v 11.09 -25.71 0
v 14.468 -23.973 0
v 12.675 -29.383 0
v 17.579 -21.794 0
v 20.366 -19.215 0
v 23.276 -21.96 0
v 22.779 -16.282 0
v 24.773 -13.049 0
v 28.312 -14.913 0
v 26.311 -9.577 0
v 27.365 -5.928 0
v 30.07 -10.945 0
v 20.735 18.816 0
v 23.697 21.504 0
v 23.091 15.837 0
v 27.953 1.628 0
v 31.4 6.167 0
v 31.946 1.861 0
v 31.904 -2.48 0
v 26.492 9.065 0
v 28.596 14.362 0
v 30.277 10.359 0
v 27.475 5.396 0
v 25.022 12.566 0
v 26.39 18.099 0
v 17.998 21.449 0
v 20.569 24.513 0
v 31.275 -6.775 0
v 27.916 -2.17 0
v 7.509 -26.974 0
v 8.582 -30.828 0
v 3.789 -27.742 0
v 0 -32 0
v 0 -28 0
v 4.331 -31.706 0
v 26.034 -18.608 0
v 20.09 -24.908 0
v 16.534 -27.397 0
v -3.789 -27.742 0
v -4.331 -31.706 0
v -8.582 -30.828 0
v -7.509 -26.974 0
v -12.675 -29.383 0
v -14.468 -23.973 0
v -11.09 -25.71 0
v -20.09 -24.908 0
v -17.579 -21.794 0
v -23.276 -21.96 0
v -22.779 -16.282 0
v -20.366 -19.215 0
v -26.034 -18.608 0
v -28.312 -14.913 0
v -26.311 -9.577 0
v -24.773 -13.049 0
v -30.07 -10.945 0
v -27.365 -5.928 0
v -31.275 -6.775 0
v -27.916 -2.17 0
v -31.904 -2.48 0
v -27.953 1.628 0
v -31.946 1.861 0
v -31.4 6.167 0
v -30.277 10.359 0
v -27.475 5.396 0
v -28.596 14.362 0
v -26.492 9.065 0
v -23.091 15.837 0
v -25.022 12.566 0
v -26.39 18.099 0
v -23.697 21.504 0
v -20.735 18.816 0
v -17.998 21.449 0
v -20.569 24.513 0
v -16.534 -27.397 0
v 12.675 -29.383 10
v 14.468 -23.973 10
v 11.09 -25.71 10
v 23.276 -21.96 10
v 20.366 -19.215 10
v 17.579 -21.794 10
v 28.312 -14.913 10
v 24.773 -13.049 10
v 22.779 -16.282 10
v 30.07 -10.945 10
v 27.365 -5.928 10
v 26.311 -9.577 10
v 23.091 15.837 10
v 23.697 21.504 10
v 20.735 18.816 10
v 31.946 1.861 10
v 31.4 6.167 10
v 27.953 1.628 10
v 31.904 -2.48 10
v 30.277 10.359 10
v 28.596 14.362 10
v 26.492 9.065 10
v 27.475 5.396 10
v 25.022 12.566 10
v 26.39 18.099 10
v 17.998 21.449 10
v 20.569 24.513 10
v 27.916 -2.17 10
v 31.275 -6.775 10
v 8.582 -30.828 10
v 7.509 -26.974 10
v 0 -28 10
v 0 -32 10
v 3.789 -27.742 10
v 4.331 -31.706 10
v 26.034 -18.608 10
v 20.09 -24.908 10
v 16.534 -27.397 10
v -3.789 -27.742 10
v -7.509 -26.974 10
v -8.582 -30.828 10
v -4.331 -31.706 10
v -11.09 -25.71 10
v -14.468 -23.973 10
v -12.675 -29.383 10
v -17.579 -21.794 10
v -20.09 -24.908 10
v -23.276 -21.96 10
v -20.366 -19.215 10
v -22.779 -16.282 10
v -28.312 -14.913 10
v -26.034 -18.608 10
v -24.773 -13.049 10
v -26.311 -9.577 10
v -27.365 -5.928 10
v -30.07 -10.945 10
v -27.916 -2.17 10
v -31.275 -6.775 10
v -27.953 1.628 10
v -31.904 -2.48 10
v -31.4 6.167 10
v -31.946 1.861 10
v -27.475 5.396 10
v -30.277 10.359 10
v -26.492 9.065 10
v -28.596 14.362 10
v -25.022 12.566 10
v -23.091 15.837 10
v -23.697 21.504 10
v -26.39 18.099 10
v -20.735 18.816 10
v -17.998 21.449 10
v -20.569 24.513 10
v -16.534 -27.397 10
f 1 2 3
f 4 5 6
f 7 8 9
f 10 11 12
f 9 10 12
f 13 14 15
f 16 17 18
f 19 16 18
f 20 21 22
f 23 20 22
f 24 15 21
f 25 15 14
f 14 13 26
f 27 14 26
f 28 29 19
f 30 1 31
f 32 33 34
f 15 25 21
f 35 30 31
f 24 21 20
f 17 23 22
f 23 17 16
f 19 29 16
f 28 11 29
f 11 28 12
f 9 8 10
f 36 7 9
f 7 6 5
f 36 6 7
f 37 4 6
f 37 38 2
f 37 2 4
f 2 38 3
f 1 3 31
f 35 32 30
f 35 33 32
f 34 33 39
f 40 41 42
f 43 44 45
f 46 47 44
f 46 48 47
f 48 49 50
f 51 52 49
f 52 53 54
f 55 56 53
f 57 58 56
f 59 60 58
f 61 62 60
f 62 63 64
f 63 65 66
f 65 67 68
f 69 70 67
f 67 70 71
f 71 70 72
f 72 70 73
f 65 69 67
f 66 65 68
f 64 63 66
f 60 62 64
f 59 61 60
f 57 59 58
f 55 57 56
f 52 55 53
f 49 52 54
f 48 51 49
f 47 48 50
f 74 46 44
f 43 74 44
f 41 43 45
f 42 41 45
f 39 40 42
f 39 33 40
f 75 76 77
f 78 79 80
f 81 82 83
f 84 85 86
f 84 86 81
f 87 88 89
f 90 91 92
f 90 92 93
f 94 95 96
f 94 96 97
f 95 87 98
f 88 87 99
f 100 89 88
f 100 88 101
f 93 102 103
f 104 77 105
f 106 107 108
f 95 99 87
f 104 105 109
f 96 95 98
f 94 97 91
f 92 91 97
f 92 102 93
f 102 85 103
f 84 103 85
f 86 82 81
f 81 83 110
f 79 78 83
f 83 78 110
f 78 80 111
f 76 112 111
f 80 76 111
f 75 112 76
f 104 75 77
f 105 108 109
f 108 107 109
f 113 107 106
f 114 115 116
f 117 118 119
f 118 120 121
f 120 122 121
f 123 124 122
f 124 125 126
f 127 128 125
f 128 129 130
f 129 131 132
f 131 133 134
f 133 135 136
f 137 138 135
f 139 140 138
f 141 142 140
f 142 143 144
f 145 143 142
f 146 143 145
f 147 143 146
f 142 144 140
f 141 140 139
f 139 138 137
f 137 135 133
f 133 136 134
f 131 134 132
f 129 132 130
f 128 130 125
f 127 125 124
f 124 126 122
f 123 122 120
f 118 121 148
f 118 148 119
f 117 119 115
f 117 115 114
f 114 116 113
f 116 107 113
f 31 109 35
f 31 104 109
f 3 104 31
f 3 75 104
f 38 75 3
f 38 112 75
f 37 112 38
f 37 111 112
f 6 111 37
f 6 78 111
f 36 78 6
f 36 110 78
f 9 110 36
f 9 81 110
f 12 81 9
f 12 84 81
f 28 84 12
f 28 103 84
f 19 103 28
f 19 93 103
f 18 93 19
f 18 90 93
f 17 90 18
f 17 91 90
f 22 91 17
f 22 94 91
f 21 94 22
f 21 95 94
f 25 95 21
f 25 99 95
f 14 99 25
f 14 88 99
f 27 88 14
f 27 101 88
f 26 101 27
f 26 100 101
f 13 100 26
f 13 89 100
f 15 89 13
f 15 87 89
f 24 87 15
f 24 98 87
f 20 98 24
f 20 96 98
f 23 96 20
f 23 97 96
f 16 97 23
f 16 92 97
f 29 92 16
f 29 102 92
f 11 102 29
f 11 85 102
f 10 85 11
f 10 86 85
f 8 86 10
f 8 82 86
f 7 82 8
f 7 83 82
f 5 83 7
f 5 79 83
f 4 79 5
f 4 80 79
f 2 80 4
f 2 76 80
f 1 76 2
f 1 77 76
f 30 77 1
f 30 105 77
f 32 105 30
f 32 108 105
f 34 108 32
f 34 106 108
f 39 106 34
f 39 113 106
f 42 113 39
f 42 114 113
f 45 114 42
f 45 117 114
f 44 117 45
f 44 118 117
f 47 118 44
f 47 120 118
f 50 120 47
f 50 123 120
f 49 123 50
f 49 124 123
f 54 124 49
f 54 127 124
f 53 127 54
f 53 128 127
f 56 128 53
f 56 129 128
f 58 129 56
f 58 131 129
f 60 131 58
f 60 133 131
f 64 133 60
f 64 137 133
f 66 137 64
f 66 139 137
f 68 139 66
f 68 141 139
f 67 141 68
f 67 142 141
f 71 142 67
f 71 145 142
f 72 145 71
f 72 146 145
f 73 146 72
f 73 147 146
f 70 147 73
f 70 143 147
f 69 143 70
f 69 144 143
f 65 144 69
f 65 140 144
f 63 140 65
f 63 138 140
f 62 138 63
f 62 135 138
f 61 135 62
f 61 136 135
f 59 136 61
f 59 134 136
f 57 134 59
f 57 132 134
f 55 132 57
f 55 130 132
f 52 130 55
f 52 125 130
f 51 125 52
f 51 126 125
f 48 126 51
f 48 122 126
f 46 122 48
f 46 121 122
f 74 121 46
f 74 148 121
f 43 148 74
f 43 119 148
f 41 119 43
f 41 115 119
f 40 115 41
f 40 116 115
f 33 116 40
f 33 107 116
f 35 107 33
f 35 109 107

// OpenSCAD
$fn = 32;

// ----------------------------------------------------------------------
// Spring clip: 64 mm outside, 4 mm band, 80 degree opening
// ----------------------------------------------------------------------

// --- parameters (mm) ---
outer_r = 32;             // clip outside radius
inner_r = 28;             // clip bore radius
band = 4;                 // band thickness
clip_w = 10;              // clip width
opening = 80;             // opening angle

clip_profile = [[-20.569, 24.513], [-23.697, 21.504], [-26.39, 18.099], [-28.596, 14.362], [-30.277, 10.359], [-31.4, 6.167], [-31.946, 1.861], [-31.904, -2.48], [-31.275, -6.775], [-30.07, -10.945], [-28.312, -14.913], [-26.034, -18.608], [-23.276, -21.96], [-20.09, -24.908], [-16.534, -27.397], [-12.675, -29.383], [-8.582, -30.828], [-4.331, -31.706], [0, -32], [4.331, -31.706], [8.582, -30.828], [12.675, -29.383], [16.534, -27.397], [20.09, -24.908], [23.276, -21.96], [26.034, -18.608], [28.312, -14.913], [30.07, -10.945], [31.275, -6.775], [31.904, -2.48], [31.946, 1.861], [31.4, 6.167], [30.277, 10.359], [28.596, 14.362], [26.39, 18.099], [23.697, 21.504], [20.569, 24.513], [17.998, 21.449], [20.735, 18.816], [23.091, 15.837], [25.022, 12.566], [26.492, 9.065], [27.475, 5.396], [27.953, 1.628], [27.916, -2.17], [27.365, -5.928], [26.311, -9.577], [24.773, -13.049], [22.779, -16.282], [20.366, -19.215], [17.579, -21.794], [14.468, -23.973], [11.09, -25.71], [7.509, -26.974], [3.789, -27.742], [0, -28], [-3.789, -27.742], [-7.509, -26.974], [-11.09, -25.71], [-14.468, -23.973], [-17.579, -21.794], [-20.366, -19.215], [-22.779, -16.282], [-24.773, -13.049], [-26.311, -9.577], [-27.365, -5.928], [-27.916, -2.17], [-27.953, 1.628], [-27.475, 5.396], [-26.492, 9.065], [-25.022, 12.566], [-23.091, 15.837], [-20.735, 18.816], [-17.998, 21.449]];

difference() {
  union() {
    linear_extrude(height = clip_w) polygon(clip_profile);
  }
}
